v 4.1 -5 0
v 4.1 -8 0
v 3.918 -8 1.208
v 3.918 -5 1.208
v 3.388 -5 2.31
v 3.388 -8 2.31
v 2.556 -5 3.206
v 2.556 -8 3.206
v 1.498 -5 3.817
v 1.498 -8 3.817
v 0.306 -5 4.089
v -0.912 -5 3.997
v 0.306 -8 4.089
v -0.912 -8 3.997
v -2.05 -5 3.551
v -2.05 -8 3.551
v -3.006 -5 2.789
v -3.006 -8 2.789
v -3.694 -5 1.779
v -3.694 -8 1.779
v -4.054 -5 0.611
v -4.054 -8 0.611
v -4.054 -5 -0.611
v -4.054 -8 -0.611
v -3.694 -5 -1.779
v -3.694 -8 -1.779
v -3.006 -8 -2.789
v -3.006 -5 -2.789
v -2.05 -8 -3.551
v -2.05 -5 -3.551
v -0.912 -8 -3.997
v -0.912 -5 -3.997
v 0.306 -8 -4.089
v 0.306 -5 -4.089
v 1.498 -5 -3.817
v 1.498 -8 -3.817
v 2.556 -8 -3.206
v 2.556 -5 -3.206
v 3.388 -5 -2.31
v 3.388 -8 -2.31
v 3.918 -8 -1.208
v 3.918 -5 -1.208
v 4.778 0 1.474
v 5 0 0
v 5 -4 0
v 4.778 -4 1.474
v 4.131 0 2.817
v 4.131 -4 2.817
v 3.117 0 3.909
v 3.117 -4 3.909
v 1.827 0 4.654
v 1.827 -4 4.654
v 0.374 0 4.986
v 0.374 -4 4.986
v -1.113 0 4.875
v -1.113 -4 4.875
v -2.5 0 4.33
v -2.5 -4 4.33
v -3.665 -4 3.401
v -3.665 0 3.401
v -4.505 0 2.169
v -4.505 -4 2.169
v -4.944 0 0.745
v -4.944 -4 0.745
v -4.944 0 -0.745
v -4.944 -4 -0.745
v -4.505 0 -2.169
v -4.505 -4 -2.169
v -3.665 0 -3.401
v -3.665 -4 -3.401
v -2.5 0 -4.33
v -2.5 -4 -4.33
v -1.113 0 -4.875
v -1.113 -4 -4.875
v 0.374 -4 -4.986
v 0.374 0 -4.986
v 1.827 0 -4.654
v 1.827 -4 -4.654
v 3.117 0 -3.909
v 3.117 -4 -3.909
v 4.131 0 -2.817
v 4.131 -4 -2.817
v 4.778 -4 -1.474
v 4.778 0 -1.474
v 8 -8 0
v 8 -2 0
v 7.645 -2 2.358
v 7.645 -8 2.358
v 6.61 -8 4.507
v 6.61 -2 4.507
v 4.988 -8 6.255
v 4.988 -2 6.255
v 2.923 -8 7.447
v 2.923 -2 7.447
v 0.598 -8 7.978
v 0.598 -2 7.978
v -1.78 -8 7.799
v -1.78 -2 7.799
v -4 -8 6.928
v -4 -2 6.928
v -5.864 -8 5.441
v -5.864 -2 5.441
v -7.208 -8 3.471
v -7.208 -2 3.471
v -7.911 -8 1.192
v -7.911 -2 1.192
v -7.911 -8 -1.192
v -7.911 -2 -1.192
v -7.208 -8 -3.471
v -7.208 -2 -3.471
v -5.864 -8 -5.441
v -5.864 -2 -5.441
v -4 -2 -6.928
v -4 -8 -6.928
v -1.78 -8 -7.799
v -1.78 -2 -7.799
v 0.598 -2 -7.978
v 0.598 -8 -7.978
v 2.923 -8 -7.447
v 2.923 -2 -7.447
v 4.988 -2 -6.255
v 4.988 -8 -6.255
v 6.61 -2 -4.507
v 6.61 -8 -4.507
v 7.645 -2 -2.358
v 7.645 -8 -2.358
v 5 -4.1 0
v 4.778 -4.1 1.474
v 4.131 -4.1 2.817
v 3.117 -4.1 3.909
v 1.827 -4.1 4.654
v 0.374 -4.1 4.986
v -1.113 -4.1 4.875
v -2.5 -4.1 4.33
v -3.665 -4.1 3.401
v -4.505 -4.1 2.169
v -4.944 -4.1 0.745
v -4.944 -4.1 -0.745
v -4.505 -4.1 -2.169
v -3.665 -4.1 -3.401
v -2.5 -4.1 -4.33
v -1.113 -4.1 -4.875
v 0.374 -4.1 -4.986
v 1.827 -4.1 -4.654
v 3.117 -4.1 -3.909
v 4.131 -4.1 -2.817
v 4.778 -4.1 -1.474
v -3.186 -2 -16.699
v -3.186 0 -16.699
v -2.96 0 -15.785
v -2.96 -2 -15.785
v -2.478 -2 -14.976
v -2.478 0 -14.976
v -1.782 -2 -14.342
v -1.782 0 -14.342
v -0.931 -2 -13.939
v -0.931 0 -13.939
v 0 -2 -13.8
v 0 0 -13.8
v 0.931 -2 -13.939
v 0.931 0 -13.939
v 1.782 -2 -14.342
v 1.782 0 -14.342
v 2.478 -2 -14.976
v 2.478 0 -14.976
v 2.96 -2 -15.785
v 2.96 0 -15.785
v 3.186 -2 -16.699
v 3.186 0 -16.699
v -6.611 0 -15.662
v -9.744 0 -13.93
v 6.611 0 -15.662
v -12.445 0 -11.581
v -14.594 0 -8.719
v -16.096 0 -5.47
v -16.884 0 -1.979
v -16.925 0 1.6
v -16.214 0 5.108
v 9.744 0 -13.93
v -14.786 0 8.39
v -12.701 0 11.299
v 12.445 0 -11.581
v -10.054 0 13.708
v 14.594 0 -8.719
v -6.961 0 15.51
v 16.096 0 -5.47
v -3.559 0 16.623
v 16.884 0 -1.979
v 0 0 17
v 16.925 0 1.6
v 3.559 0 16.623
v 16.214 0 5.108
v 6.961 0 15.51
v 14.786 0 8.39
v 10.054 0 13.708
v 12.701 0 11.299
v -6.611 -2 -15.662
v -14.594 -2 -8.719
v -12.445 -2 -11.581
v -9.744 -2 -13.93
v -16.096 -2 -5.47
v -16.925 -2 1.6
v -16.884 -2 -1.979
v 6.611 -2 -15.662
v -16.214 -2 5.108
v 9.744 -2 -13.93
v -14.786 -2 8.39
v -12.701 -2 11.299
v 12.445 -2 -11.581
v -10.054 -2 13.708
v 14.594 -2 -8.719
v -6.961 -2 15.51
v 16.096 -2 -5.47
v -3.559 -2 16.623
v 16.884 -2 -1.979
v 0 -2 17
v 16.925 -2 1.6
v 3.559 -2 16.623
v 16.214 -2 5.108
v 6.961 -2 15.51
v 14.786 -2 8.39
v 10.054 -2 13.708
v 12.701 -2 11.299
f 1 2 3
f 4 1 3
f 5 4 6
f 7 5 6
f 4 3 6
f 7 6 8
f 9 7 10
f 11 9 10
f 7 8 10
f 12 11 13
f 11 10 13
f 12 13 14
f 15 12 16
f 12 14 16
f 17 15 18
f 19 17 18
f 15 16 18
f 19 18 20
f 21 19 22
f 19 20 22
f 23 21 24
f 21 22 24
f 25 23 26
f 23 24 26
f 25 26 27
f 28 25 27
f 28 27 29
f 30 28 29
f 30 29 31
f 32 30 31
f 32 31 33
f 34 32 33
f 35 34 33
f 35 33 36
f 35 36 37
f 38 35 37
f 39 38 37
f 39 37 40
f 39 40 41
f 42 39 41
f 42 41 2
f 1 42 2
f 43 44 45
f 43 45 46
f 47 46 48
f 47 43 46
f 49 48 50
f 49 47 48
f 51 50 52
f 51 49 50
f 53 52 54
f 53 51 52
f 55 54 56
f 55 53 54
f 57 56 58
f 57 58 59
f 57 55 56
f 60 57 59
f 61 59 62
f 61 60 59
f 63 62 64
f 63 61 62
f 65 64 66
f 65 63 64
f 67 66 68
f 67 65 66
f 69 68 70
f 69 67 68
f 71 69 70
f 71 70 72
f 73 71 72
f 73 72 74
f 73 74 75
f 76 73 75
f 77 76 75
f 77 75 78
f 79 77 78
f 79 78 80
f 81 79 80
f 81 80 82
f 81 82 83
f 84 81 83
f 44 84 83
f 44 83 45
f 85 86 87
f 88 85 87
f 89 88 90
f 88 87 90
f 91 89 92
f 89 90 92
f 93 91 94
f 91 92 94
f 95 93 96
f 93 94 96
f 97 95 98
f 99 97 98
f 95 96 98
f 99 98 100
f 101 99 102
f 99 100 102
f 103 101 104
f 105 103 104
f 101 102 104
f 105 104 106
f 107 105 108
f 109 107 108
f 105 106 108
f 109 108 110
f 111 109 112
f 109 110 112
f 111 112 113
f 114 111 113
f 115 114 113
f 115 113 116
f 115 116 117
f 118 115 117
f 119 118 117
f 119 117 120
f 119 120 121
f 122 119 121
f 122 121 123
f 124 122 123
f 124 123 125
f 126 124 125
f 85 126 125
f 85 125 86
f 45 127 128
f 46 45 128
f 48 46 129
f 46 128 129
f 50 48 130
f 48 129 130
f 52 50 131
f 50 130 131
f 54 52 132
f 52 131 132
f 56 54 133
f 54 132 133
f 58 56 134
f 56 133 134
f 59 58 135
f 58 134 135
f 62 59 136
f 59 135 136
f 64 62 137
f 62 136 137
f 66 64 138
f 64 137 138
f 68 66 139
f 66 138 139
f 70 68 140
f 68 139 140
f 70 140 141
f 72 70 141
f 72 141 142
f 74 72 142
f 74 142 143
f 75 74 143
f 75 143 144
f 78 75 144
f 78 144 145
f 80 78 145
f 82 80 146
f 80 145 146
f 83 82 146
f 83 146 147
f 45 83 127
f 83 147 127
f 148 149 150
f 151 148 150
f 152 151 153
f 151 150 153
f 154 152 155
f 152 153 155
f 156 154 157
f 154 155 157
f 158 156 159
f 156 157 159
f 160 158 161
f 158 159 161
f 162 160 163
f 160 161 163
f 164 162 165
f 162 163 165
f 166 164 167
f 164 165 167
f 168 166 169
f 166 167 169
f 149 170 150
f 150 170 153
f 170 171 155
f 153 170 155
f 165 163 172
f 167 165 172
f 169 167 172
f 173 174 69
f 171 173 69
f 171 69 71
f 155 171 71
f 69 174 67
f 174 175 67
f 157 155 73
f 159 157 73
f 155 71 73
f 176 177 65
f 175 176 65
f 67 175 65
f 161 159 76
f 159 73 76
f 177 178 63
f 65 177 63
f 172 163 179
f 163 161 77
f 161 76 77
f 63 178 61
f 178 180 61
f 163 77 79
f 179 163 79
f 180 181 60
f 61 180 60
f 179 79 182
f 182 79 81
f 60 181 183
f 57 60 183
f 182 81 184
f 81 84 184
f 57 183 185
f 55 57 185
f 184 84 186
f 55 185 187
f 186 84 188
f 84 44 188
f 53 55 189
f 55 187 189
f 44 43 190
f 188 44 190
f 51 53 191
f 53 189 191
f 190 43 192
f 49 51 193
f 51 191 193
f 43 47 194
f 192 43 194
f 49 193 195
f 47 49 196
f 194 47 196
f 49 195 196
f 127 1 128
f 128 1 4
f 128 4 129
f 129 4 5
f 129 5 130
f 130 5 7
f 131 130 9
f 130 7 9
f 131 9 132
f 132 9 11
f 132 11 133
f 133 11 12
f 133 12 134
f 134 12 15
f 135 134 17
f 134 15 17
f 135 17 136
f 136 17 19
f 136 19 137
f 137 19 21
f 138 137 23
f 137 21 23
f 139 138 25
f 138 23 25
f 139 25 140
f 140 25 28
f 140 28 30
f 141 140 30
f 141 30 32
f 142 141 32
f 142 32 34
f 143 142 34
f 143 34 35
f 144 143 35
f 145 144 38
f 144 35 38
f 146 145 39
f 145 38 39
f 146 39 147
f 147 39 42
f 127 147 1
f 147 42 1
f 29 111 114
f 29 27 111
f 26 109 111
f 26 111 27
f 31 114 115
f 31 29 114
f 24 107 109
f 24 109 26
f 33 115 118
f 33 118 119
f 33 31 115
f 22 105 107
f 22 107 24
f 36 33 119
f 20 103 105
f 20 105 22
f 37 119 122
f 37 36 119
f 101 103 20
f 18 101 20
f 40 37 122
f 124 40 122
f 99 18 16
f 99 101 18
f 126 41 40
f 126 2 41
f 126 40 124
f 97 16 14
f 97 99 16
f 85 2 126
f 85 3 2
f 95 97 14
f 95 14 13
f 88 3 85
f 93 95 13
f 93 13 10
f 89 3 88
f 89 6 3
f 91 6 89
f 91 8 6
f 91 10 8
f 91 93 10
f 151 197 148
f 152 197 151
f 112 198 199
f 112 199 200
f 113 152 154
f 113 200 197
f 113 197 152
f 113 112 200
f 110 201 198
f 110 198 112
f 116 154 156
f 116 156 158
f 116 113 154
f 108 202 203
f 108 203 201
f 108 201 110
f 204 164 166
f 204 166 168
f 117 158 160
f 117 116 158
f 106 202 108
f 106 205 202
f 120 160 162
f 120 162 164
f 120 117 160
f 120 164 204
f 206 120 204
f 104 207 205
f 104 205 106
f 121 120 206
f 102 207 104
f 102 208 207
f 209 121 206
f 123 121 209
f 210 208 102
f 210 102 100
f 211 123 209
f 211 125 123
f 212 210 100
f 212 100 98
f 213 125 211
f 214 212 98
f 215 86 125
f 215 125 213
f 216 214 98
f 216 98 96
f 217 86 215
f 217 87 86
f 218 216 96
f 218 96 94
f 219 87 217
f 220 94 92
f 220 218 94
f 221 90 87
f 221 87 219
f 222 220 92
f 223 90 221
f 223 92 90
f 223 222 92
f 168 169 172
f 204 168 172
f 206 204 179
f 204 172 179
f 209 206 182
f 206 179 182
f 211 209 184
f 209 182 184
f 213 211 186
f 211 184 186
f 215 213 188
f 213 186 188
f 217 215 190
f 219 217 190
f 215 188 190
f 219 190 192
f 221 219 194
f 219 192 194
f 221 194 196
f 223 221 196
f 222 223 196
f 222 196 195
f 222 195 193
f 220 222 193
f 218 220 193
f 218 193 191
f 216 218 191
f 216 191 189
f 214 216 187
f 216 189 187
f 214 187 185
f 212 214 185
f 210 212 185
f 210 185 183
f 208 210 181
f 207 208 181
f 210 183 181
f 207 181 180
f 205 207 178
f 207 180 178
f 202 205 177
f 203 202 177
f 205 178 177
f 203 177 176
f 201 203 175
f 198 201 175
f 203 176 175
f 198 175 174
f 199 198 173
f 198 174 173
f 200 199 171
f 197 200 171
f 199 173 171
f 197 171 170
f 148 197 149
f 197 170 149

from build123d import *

# Parameters (mm, degrees)
F0_R        = 5
F1_DEPTH    = 2
F2_R        = 8
F2_R_2      = 5
F3_DEPTH    = 8
F4_R        = 5
F4_R_2      = 4.1
F5_DEPTH    = 4
F6_S5_R     = 5
F6_T6_DEPTH = 9


# Not quite as in the source:
# - a fillet or chamfer that OpenCascade refuses, or shapes differently, is made with other operations: its cross-section is extruded or revolved along the edge and cut away or added


with BuildPart() as f1:
    # F0 (on Front) → F1 (new body)
    with BuildSketch(Plane.XZ):
        with BuildLine():
            ThreePointArc((-3.1857954632, -16.6988235294), (0, -13.8), (3.1857954632, -16.6988235294))
            ThreePointArc((3.1857954632, -16.6988235294), (0, 17), (-3.1857954632, -16.6988235294))
        make_face()
        Circle(F0_R, mode=Mode.SUBTRACT)
    extrude(amount=F1_DEPTH)

    # F2 (on Front) → F3 (join)
    with BuildSketch(Plane.XZ):
        Circle(F2_R)
        Circle(F2_R_2, mode=Mode.SUBTRACT)
    extrude(amount=F3_DEPTH)

    # F4 (on face) → F5 (join)
    with BuildSketch(Plane.XZ.offset(8)):
        Circle(F4_R)
        Circle(F4_R_2, mode=Mode.SUBTRACT)
    extrude(amount=-F5_DEPTH)

    # F6: chamfer of 1 on 1 edges, made by hand


with BuildPart() as f6_tool2:
    # F6_s3 → F6_t4 (revolve)
    with BuildSketch(Plane.XY):
        Polygon((5.1, -4), (4.1, -5), (4.1, -4), align=None)
    revolve(axis=Axis((0, -4, 0), (0, -1, 0)))

    # F6_s5 → F6_t6 (intersect, symmetric)
    with BuildSketch(Plane.XZ.offset(4.5)):
        Circle(F6_S5_R)
    extrude(amount=F6_T6_DEPTH, both=True, mode=Mode.INTERSECT)


with BuildPart() as f1_1:
    add(f1.part)

    # F6_t1: cut F6_tool2
    add(f6_tool2.part, mode=Mode.SUBTRACT)


solid = f1_1.part
